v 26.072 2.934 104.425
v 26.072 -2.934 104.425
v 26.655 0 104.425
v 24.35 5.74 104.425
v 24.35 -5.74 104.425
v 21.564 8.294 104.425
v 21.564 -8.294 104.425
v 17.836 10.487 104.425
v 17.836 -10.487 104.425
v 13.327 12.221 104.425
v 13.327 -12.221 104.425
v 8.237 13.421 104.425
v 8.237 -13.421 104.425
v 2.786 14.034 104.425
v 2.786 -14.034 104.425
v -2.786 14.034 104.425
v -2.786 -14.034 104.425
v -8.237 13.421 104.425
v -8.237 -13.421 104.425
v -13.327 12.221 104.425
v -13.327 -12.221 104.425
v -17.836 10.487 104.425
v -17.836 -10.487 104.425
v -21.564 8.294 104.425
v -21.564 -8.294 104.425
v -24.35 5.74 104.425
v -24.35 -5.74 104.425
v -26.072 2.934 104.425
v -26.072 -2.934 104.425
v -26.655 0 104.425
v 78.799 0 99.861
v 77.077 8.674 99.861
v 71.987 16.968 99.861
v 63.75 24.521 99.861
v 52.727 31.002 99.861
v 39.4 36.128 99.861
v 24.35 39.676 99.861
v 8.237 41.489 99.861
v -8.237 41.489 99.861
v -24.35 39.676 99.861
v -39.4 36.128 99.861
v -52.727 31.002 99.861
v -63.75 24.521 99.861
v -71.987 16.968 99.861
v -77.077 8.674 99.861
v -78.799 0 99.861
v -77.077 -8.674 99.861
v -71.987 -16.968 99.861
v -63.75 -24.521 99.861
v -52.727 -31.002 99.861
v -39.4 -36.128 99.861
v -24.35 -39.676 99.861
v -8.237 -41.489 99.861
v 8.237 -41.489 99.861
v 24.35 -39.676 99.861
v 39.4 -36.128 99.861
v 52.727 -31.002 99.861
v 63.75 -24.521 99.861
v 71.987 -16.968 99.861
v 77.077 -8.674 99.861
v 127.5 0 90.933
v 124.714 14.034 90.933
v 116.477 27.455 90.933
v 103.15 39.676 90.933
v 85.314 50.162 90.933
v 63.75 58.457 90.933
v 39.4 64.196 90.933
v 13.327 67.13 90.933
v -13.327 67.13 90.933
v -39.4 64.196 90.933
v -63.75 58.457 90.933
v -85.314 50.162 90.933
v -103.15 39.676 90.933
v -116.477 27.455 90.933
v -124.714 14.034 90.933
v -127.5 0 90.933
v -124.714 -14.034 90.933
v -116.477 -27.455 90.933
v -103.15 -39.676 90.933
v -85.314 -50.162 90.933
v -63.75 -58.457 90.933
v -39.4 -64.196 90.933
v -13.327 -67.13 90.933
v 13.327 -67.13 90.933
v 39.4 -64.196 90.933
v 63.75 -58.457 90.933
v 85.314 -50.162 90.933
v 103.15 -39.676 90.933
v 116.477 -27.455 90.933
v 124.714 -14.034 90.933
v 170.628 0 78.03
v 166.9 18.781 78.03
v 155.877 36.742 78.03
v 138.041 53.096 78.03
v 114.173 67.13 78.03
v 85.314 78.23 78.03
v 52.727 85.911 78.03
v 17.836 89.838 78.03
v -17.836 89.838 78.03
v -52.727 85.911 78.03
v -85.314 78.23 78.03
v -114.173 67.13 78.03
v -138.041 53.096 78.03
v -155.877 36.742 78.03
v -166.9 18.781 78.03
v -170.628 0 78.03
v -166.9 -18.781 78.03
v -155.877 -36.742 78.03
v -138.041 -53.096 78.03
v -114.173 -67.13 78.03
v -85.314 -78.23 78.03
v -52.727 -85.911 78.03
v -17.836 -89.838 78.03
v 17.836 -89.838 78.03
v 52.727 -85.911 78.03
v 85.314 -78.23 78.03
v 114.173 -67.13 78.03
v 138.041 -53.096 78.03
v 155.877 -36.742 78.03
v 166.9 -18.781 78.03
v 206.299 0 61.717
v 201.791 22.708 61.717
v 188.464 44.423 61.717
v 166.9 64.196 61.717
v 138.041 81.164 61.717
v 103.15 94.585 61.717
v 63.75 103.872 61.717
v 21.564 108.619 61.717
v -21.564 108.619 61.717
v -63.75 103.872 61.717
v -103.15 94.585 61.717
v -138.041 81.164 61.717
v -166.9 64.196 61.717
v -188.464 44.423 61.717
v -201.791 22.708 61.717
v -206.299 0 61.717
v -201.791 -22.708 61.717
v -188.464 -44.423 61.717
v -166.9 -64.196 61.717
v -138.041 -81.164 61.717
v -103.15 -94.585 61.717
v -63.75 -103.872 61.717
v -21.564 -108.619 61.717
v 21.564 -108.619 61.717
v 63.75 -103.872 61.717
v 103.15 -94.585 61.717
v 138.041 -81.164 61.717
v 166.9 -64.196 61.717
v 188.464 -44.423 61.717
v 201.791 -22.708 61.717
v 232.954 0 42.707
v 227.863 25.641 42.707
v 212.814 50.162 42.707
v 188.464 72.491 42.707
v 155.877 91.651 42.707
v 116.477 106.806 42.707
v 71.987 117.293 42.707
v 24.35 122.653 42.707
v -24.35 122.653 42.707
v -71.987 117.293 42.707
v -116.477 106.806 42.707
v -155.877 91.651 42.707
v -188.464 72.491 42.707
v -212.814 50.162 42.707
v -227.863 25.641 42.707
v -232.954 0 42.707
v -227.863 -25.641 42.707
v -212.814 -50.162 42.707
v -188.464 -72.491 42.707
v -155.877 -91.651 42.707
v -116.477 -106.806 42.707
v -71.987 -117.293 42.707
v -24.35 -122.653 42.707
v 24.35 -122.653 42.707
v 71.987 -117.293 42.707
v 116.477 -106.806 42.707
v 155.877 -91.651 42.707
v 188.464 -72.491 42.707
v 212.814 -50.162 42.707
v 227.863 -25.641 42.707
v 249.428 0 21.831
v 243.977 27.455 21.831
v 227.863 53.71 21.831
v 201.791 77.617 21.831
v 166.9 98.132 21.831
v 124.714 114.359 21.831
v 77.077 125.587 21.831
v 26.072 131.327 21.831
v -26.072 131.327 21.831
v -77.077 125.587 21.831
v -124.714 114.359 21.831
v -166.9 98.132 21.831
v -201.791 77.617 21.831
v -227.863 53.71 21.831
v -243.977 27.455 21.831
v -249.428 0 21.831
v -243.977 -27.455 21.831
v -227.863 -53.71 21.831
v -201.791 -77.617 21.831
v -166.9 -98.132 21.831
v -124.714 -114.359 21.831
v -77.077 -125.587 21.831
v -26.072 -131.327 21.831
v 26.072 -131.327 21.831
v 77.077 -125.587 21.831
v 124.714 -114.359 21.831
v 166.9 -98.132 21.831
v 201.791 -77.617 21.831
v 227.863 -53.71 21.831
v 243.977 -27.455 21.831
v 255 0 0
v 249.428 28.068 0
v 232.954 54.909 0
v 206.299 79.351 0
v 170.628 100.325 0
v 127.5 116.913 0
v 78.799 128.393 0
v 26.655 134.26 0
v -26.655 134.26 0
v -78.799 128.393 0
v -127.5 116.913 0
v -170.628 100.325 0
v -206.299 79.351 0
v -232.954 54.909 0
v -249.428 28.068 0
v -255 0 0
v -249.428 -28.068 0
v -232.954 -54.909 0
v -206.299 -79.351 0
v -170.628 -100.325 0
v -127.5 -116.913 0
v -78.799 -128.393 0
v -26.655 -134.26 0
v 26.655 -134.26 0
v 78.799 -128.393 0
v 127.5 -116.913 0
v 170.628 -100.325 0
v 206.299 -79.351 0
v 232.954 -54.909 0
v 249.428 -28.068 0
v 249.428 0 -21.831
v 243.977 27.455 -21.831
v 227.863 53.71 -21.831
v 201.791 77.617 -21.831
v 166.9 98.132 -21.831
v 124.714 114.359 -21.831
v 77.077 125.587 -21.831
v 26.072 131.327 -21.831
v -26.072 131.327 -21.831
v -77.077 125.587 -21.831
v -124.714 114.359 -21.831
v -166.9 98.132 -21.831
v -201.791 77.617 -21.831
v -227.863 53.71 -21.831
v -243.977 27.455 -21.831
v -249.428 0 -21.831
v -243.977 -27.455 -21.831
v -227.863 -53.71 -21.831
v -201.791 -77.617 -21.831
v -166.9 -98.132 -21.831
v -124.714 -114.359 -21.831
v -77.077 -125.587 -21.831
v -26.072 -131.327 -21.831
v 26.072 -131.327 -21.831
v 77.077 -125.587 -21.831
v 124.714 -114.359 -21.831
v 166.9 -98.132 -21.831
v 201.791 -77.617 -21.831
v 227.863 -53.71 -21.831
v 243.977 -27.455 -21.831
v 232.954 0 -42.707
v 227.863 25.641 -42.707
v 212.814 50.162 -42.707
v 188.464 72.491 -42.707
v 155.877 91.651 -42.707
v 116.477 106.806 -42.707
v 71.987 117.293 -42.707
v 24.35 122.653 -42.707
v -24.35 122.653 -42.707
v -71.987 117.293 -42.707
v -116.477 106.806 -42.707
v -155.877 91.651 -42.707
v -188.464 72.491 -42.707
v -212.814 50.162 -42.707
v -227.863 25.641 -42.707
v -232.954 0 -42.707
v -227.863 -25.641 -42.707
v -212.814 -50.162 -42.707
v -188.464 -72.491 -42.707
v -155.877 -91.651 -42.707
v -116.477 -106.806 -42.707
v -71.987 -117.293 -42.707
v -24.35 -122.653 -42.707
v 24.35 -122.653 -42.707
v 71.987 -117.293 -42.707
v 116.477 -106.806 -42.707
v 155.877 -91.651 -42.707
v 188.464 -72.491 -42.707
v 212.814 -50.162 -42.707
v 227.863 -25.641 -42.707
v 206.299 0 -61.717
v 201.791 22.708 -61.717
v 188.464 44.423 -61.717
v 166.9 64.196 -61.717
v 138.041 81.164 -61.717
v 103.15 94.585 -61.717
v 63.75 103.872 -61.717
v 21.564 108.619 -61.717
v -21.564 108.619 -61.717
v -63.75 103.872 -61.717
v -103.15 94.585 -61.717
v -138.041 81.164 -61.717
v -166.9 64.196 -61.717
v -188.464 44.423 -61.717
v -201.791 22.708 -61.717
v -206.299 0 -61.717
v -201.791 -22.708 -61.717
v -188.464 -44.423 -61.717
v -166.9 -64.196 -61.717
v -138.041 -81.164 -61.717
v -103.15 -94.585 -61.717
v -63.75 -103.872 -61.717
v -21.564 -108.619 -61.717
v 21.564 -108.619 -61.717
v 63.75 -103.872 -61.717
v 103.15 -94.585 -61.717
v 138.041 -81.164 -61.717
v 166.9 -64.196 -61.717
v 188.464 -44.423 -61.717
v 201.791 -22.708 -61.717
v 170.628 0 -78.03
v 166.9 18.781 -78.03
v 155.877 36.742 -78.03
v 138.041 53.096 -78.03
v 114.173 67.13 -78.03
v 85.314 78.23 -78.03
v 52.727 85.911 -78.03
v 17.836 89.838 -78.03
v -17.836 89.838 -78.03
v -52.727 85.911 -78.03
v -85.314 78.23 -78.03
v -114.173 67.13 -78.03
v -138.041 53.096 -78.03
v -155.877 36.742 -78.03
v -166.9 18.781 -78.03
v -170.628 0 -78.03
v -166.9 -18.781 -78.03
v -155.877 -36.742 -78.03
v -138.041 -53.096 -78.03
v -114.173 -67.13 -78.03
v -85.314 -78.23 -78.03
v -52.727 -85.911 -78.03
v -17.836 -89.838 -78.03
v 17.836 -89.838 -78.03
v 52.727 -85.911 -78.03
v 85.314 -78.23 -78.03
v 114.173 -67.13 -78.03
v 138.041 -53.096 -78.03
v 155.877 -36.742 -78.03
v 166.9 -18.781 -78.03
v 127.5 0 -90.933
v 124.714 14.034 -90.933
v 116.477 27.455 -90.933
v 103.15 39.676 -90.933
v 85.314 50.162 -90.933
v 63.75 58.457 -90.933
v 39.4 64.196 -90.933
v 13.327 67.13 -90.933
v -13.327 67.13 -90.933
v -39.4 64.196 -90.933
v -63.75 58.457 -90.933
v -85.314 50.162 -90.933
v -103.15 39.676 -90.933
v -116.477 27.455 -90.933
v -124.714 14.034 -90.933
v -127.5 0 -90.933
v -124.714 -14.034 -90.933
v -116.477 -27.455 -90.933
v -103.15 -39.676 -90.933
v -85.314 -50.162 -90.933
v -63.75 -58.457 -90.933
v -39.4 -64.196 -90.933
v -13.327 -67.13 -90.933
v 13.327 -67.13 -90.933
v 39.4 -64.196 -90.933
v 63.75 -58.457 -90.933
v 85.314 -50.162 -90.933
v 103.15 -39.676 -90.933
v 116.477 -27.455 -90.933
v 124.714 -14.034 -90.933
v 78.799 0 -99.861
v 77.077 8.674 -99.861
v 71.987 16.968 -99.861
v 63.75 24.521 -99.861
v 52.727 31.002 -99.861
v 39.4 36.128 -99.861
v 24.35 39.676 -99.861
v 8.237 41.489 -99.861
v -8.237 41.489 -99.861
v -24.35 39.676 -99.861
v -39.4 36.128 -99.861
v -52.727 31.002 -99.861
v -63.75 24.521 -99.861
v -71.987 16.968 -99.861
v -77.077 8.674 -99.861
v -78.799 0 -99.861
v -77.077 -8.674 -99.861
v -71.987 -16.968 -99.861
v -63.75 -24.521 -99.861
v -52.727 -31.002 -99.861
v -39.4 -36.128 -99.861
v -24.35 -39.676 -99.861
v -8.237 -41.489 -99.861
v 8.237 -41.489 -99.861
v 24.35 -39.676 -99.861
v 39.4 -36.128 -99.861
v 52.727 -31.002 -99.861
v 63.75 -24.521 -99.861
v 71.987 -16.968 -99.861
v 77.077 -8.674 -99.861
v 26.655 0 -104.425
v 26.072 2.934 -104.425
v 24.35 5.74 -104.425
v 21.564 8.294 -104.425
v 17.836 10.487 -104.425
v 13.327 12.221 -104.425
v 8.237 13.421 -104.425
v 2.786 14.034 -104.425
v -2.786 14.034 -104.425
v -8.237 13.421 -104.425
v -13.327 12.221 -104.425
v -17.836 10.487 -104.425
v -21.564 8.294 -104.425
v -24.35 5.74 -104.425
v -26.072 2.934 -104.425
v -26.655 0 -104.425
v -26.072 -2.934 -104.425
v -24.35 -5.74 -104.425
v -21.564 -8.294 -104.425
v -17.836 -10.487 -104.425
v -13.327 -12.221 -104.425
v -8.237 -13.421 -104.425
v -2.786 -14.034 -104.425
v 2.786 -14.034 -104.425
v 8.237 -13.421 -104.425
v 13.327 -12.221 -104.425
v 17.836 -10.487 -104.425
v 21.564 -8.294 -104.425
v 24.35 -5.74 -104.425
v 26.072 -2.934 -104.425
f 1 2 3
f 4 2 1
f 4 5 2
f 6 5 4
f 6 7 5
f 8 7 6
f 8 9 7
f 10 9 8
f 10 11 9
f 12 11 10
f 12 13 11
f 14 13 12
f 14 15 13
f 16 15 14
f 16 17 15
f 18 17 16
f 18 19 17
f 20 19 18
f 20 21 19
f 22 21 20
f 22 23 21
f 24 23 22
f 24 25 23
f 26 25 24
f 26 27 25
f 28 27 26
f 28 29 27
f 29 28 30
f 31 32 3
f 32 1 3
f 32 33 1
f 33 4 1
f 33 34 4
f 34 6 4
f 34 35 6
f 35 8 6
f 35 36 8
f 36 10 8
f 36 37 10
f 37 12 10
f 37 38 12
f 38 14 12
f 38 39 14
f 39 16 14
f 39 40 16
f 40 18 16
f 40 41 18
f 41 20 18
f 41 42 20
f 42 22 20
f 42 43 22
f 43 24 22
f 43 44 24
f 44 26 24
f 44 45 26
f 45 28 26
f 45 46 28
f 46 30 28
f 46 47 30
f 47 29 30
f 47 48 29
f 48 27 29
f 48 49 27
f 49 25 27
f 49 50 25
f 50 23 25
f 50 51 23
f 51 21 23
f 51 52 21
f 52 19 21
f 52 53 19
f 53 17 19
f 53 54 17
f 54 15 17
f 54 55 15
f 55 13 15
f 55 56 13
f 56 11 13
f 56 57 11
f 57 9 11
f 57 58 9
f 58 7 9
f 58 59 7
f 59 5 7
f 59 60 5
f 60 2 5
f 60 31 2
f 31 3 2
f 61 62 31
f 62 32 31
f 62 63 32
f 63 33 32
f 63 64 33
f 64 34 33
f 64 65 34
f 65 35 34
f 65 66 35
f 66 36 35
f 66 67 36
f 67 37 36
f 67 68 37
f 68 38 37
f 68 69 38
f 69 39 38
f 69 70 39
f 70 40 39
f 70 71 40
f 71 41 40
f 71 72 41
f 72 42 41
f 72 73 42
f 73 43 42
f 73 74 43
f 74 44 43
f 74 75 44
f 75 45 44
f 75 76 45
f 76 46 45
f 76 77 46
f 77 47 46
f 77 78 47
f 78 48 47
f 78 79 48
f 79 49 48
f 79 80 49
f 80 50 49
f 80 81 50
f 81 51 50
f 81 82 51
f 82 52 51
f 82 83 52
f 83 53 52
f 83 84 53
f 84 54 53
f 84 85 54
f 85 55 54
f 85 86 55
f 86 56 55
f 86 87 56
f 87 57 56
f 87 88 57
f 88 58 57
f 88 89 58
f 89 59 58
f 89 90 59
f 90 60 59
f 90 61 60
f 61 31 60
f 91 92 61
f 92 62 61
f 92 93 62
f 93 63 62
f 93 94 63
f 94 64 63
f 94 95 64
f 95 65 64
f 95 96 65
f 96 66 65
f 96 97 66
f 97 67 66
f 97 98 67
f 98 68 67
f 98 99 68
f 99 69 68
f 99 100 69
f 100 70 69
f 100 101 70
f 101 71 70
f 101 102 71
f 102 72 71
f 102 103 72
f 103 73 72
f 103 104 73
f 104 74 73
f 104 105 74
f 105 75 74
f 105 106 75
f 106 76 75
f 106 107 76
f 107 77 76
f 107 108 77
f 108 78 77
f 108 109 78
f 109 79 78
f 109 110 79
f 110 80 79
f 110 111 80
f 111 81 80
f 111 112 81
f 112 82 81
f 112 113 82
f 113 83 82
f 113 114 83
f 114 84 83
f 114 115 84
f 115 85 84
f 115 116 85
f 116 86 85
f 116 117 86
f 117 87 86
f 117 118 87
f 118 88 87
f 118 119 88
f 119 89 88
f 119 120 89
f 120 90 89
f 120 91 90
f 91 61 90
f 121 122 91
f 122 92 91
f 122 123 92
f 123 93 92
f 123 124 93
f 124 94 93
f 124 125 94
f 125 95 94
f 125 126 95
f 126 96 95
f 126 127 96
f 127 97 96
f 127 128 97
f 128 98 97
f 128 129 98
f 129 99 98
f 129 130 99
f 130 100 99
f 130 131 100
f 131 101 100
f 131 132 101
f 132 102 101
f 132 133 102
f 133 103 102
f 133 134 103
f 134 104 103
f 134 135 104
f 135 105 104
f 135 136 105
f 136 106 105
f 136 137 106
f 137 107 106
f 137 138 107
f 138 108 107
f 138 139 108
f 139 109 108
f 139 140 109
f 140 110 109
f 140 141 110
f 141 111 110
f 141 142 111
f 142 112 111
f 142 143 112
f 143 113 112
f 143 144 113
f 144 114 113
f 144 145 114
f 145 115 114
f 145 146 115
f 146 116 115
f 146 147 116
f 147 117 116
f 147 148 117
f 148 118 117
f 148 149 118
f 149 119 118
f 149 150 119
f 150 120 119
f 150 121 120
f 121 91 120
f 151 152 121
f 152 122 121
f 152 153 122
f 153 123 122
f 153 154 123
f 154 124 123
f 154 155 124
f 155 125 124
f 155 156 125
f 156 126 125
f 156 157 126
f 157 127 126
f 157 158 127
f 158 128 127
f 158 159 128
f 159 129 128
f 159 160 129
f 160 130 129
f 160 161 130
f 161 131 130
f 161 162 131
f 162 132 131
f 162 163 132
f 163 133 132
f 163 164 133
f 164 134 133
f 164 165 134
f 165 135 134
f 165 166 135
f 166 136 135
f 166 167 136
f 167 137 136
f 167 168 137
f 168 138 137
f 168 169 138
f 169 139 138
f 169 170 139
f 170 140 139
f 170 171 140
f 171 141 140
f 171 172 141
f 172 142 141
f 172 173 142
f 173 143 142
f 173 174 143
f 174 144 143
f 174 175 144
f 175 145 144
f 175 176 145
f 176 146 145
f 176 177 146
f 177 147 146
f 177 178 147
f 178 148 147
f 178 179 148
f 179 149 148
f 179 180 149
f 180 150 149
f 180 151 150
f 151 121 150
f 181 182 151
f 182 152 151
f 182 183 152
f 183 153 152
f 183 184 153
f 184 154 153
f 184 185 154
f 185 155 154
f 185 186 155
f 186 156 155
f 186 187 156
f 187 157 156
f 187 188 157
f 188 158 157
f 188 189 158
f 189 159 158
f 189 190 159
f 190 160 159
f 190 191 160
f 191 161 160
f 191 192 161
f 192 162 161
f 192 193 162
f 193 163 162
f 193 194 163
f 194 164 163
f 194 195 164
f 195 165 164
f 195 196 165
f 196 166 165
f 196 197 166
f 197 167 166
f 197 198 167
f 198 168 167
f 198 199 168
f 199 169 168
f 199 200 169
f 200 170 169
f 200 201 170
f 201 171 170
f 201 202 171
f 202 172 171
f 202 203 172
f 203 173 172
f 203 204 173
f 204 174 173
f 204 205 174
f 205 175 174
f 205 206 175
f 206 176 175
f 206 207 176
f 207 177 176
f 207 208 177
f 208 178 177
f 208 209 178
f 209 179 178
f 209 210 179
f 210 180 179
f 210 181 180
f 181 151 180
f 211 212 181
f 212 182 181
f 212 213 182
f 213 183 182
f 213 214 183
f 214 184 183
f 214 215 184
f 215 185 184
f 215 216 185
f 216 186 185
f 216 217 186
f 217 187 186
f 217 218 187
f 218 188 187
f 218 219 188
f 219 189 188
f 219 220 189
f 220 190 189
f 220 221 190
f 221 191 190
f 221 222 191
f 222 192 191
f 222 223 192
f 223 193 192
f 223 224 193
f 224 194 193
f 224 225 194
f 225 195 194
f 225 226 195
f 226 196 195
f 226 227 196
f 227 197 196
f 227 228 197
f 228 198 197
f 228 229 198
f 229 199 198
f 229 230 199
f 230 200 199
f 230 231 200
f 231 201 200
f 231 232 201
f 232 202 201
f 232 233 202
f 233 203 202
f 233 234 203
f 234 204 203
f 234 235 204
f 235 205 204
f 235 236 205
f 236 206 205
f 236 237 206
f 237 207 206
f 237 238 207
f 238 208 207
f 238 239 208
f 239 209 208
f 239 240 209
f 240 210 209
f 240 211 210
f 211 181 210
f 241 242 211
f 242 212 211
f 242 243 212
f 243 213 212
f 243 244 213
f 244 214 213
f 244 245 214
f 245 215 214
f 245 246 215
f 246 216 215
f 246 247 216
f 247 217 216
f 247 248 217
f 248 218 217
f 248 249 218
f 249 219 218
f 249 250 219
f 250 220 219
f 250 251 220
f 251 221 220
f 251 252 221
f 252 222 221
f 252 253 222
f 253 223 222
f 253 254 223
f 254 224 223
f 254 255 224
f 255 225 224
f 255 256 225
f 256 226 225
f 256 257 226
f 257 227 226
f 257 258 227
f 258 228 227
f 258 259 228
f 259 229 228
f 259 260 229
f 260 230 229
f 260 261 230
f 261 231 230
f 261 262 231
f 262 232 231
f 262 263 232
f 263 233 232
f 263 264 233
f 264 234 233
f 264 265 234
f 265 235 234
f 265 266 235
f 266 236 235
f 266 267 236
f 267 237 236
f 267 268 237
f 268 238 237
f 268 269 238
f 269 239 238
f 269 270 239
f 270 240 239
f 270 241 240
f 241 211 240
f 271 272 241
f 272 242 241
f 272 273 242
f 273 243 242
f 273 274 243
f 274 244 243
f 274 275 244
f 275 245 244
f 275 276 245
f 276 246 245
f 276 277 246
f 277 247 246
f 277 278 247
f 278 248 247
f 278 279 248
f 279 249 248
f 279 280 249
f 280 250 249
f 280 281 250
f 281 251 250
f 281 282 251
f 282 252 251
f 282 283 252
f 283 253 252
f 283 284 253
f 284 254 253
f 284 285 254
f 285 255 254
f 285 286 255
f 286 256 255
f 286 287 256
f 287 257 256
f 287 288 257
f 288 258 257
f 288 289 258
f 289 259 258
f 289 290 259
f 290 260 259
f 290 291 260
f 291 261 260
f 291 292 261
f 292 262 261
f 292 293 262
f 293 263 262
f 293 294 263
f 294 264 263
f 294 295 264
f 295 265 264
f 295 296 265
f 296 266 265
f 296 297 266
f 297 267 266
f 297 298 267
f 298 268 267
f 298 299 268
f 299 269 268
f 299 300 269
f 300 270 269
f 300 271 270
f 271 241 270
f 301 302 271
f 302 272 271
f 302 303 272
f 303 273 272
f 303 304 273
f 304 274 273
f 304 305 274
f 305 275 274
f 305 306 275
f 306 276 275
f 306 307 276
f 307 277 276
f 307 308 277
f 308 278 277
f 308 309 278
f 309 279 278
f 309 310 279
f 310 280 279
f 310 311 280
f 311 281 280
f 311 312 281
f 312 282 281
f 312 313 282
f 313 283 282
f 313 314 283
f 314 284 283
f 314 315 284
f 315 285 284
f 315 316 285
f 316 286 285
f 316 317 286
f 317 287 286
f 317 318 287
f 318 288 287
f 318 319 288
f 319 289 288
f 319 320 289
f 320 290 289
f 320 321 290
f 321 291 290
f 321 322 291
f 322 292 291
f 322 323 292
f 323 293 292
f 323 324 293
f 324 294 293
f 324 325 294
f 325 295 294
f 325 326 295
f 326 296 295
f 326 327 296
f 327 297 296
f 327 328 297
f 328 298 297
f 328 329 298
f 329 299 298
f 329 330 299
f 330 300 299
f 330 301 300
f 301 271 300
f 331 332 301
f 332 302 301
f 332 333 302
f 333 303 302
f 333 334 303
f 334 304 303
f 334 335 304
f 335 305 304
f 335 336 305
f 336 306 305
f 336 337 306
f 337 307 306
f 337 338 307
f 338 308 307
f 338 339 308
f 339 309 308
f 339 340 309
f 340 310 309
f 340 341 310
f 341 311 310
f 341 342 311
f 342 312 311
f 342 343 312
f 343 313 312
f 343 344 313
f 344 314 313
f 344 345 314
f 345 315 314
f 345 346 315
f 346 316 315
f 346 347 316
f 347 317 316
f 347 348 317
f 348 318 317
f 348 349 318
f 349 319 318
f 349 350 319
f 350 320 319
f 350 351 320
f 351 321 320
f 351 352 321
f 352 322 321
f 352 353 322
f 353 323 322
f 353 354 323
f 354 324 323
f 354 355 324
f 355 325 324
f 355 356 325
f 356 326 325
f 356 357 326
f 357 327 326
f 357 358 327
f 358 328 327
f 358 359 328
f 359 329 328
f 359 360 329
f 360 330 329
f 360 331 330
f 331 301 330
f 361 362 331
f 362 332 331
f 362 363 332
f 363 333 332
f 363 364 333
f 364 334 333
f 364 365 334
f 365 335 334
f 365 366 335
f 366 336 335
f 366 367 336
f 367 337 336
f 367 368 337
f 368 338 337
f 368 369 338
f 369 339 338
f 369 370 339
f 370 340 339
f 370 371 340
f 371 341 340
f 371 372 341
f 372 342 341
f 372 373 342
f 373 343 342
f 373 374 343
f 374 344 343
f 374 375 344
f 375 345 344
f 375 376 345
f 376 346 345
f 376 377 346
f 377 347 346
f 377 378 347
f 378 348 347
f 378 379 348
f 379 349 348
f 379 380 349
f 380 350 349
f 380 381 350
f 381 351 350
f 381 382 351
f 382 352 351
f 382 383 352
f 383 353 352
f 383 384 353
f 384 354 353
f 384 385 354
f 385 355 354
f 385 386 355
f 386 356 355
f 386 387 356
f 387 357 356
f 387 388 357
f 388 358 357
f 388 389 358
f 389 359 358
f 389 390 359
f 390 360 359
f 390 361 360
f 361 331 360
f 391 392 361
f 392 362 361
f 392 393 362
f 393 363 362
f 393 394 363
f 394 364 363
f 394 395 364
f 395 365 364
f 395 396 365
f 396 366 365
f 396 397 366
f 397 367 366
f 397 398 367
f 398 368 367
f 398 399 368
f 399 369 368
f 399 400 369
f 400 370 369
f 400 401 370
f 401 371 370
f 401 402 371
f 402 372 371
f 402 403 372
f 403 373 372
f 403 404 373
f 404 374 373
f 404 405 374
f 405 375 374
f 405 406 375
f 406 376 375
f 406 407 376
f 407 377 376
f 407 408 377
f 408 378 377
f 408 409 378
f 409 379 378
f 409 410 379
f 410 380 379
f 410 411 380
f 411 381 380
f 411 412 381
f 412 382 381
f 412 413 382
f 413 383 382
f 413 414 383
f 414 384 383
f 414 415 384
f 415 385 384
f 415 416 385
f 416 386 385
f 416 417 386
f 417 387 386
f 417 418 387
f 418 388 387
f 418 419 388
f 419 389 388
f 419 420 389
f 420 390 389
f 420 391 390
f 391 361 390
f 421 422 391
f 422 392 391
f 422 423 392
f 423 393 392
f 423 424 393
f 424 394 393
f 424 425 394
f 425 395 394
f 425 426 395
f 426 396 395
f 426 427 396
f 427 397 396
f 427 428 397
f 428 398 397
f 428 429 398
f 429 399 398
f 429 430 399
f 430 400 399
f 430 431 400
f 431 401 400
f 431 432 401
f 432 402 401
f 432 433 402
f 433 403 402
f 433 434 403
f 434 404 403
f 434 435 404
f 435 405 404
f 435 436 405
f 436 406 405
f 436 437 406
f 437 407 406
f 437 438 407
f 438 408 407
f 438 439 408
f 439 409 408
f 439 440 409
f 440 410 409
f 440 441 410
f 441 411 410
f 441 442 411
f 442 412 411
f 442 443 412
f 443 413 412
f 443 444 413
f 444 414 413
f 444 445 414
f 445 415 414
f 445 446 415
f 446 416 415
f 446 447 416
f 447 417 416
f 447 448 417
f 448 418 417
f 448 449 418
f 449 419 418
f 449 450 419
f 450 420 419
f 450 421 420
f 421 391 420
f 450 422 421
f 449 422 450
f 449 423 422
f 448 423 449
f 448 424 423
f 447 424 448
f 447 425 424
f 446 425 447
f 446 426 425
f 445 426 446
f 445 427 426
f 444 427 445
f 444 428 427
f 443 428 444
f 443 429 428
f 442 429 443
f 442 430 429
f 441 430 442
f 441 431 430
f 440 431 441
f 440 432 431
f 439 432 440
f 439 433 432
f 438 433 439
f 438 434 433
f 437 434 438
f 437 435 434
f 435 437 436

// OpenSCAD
// Generated by SolidPython 1.0.1 on 2020-07-29 00:46:53


scale(v = [17, 9, 7]) {
	sphere(r = 15);
}
/***********************************************
*********      SolidPython code:      **********
************************************************
 
# import packages: SolidPython
from solid import *
from solid.utils import *
from itertools import chain, combinations, permutations


class Resize:

    def __init__(self, scad_file):
        self.scad_file = scad_file
        #self.scad_file = import_scad(scad_file)
        # cone/cylinder param:
        self.r1 = 0
        self.r2 = 0
        self.h = 0
        # rectangular prism param:
        self.w = 0
        self.l = 0
        # ellipse param:
        self.r = 0

    # import OpenScad code (file name corresponds to shape)


    # classify shape + parameters
    def assign(self, param1, param2, param3):
        if self.scad_file == 'cone.scad':
            self.r1 = param1
            self.r2 = param2
            self.h = param3
        elif self.scad_file == 'cylinder.scad':
            self.r1 = param1
            self.r2 = param2
            self.h = param3
        elif self.scad_file == 'rectangularPrism.scad':
            self.h = param1
            self.l = param2
            self.w = param3
        else:
            self.r = param1
            self.h = param2

    # resize parameters
    def iterate(self):
        x = range(3, 20, 2)
        i = 1
        if self.scad_file == 'cone.scad':
            tempList = list(permutations(x, 2))
            for temp in tempList:
                param1 = temp[0]
                param2 = temp[1]
                filepath = 'produced_scad_files/' + 'cone' + str(param1) + '_' + str(param2) + '_' + '.scad'
                scad_render_to_file(cylinder(h=param1, r1=param2, r2=0), filepath)

        elif self.scad_file == 'cylinder.scad':
            tempList = list(permutations(x, 3))
            for temp in tempList:
                param1 = temp[0]
                param2 = temp[1]
                filepath = 'produced_scad_files/' + 'cylinder' + str(param1) + '_' + str(param2) + '_' + '.scad'
                scad_render_to_file(cylinder(h=param1, r1=param2, r2=param2), filepath)

        elif self.scad_file == 'rectangularPrism.scad':
            tempList = list(permutations(x, 3))
            for temp in tempList:
                param1 = temp[0]
                param2 = temp[1]
                param3 = temp[2]
                filepath = 'produced_scad_files/' + 'rectangularPrism' + str(param1) + '_' + str(param2) + '_' + str(
                    param3) + '.scad'
                scad_render_to_file(cube(size=(param1, param2, param3)), filepath)

        elif self.scad_file == 'ellipse.scad':
            tempList = list(permutations(x, 4))
            for temp in tempList:
                param1 = temp[0]
                param2 = temp[1]
                param3 = temp[2]
                param4 = temp[3]
                filepath = 'produced_scad_files/' + 'ellipse' + str(param1) + '_' + str(param2) + '_' + str(param3) + '_' + str(param4) + '.scad'
                scad_render_to_file(scale([param1, param2, param3])(sphere(r=param4)), filepath)

    def render_to_scadfile(self):
        scad_render_to_file(scad, 'example.scad') 
 
************************************************/
